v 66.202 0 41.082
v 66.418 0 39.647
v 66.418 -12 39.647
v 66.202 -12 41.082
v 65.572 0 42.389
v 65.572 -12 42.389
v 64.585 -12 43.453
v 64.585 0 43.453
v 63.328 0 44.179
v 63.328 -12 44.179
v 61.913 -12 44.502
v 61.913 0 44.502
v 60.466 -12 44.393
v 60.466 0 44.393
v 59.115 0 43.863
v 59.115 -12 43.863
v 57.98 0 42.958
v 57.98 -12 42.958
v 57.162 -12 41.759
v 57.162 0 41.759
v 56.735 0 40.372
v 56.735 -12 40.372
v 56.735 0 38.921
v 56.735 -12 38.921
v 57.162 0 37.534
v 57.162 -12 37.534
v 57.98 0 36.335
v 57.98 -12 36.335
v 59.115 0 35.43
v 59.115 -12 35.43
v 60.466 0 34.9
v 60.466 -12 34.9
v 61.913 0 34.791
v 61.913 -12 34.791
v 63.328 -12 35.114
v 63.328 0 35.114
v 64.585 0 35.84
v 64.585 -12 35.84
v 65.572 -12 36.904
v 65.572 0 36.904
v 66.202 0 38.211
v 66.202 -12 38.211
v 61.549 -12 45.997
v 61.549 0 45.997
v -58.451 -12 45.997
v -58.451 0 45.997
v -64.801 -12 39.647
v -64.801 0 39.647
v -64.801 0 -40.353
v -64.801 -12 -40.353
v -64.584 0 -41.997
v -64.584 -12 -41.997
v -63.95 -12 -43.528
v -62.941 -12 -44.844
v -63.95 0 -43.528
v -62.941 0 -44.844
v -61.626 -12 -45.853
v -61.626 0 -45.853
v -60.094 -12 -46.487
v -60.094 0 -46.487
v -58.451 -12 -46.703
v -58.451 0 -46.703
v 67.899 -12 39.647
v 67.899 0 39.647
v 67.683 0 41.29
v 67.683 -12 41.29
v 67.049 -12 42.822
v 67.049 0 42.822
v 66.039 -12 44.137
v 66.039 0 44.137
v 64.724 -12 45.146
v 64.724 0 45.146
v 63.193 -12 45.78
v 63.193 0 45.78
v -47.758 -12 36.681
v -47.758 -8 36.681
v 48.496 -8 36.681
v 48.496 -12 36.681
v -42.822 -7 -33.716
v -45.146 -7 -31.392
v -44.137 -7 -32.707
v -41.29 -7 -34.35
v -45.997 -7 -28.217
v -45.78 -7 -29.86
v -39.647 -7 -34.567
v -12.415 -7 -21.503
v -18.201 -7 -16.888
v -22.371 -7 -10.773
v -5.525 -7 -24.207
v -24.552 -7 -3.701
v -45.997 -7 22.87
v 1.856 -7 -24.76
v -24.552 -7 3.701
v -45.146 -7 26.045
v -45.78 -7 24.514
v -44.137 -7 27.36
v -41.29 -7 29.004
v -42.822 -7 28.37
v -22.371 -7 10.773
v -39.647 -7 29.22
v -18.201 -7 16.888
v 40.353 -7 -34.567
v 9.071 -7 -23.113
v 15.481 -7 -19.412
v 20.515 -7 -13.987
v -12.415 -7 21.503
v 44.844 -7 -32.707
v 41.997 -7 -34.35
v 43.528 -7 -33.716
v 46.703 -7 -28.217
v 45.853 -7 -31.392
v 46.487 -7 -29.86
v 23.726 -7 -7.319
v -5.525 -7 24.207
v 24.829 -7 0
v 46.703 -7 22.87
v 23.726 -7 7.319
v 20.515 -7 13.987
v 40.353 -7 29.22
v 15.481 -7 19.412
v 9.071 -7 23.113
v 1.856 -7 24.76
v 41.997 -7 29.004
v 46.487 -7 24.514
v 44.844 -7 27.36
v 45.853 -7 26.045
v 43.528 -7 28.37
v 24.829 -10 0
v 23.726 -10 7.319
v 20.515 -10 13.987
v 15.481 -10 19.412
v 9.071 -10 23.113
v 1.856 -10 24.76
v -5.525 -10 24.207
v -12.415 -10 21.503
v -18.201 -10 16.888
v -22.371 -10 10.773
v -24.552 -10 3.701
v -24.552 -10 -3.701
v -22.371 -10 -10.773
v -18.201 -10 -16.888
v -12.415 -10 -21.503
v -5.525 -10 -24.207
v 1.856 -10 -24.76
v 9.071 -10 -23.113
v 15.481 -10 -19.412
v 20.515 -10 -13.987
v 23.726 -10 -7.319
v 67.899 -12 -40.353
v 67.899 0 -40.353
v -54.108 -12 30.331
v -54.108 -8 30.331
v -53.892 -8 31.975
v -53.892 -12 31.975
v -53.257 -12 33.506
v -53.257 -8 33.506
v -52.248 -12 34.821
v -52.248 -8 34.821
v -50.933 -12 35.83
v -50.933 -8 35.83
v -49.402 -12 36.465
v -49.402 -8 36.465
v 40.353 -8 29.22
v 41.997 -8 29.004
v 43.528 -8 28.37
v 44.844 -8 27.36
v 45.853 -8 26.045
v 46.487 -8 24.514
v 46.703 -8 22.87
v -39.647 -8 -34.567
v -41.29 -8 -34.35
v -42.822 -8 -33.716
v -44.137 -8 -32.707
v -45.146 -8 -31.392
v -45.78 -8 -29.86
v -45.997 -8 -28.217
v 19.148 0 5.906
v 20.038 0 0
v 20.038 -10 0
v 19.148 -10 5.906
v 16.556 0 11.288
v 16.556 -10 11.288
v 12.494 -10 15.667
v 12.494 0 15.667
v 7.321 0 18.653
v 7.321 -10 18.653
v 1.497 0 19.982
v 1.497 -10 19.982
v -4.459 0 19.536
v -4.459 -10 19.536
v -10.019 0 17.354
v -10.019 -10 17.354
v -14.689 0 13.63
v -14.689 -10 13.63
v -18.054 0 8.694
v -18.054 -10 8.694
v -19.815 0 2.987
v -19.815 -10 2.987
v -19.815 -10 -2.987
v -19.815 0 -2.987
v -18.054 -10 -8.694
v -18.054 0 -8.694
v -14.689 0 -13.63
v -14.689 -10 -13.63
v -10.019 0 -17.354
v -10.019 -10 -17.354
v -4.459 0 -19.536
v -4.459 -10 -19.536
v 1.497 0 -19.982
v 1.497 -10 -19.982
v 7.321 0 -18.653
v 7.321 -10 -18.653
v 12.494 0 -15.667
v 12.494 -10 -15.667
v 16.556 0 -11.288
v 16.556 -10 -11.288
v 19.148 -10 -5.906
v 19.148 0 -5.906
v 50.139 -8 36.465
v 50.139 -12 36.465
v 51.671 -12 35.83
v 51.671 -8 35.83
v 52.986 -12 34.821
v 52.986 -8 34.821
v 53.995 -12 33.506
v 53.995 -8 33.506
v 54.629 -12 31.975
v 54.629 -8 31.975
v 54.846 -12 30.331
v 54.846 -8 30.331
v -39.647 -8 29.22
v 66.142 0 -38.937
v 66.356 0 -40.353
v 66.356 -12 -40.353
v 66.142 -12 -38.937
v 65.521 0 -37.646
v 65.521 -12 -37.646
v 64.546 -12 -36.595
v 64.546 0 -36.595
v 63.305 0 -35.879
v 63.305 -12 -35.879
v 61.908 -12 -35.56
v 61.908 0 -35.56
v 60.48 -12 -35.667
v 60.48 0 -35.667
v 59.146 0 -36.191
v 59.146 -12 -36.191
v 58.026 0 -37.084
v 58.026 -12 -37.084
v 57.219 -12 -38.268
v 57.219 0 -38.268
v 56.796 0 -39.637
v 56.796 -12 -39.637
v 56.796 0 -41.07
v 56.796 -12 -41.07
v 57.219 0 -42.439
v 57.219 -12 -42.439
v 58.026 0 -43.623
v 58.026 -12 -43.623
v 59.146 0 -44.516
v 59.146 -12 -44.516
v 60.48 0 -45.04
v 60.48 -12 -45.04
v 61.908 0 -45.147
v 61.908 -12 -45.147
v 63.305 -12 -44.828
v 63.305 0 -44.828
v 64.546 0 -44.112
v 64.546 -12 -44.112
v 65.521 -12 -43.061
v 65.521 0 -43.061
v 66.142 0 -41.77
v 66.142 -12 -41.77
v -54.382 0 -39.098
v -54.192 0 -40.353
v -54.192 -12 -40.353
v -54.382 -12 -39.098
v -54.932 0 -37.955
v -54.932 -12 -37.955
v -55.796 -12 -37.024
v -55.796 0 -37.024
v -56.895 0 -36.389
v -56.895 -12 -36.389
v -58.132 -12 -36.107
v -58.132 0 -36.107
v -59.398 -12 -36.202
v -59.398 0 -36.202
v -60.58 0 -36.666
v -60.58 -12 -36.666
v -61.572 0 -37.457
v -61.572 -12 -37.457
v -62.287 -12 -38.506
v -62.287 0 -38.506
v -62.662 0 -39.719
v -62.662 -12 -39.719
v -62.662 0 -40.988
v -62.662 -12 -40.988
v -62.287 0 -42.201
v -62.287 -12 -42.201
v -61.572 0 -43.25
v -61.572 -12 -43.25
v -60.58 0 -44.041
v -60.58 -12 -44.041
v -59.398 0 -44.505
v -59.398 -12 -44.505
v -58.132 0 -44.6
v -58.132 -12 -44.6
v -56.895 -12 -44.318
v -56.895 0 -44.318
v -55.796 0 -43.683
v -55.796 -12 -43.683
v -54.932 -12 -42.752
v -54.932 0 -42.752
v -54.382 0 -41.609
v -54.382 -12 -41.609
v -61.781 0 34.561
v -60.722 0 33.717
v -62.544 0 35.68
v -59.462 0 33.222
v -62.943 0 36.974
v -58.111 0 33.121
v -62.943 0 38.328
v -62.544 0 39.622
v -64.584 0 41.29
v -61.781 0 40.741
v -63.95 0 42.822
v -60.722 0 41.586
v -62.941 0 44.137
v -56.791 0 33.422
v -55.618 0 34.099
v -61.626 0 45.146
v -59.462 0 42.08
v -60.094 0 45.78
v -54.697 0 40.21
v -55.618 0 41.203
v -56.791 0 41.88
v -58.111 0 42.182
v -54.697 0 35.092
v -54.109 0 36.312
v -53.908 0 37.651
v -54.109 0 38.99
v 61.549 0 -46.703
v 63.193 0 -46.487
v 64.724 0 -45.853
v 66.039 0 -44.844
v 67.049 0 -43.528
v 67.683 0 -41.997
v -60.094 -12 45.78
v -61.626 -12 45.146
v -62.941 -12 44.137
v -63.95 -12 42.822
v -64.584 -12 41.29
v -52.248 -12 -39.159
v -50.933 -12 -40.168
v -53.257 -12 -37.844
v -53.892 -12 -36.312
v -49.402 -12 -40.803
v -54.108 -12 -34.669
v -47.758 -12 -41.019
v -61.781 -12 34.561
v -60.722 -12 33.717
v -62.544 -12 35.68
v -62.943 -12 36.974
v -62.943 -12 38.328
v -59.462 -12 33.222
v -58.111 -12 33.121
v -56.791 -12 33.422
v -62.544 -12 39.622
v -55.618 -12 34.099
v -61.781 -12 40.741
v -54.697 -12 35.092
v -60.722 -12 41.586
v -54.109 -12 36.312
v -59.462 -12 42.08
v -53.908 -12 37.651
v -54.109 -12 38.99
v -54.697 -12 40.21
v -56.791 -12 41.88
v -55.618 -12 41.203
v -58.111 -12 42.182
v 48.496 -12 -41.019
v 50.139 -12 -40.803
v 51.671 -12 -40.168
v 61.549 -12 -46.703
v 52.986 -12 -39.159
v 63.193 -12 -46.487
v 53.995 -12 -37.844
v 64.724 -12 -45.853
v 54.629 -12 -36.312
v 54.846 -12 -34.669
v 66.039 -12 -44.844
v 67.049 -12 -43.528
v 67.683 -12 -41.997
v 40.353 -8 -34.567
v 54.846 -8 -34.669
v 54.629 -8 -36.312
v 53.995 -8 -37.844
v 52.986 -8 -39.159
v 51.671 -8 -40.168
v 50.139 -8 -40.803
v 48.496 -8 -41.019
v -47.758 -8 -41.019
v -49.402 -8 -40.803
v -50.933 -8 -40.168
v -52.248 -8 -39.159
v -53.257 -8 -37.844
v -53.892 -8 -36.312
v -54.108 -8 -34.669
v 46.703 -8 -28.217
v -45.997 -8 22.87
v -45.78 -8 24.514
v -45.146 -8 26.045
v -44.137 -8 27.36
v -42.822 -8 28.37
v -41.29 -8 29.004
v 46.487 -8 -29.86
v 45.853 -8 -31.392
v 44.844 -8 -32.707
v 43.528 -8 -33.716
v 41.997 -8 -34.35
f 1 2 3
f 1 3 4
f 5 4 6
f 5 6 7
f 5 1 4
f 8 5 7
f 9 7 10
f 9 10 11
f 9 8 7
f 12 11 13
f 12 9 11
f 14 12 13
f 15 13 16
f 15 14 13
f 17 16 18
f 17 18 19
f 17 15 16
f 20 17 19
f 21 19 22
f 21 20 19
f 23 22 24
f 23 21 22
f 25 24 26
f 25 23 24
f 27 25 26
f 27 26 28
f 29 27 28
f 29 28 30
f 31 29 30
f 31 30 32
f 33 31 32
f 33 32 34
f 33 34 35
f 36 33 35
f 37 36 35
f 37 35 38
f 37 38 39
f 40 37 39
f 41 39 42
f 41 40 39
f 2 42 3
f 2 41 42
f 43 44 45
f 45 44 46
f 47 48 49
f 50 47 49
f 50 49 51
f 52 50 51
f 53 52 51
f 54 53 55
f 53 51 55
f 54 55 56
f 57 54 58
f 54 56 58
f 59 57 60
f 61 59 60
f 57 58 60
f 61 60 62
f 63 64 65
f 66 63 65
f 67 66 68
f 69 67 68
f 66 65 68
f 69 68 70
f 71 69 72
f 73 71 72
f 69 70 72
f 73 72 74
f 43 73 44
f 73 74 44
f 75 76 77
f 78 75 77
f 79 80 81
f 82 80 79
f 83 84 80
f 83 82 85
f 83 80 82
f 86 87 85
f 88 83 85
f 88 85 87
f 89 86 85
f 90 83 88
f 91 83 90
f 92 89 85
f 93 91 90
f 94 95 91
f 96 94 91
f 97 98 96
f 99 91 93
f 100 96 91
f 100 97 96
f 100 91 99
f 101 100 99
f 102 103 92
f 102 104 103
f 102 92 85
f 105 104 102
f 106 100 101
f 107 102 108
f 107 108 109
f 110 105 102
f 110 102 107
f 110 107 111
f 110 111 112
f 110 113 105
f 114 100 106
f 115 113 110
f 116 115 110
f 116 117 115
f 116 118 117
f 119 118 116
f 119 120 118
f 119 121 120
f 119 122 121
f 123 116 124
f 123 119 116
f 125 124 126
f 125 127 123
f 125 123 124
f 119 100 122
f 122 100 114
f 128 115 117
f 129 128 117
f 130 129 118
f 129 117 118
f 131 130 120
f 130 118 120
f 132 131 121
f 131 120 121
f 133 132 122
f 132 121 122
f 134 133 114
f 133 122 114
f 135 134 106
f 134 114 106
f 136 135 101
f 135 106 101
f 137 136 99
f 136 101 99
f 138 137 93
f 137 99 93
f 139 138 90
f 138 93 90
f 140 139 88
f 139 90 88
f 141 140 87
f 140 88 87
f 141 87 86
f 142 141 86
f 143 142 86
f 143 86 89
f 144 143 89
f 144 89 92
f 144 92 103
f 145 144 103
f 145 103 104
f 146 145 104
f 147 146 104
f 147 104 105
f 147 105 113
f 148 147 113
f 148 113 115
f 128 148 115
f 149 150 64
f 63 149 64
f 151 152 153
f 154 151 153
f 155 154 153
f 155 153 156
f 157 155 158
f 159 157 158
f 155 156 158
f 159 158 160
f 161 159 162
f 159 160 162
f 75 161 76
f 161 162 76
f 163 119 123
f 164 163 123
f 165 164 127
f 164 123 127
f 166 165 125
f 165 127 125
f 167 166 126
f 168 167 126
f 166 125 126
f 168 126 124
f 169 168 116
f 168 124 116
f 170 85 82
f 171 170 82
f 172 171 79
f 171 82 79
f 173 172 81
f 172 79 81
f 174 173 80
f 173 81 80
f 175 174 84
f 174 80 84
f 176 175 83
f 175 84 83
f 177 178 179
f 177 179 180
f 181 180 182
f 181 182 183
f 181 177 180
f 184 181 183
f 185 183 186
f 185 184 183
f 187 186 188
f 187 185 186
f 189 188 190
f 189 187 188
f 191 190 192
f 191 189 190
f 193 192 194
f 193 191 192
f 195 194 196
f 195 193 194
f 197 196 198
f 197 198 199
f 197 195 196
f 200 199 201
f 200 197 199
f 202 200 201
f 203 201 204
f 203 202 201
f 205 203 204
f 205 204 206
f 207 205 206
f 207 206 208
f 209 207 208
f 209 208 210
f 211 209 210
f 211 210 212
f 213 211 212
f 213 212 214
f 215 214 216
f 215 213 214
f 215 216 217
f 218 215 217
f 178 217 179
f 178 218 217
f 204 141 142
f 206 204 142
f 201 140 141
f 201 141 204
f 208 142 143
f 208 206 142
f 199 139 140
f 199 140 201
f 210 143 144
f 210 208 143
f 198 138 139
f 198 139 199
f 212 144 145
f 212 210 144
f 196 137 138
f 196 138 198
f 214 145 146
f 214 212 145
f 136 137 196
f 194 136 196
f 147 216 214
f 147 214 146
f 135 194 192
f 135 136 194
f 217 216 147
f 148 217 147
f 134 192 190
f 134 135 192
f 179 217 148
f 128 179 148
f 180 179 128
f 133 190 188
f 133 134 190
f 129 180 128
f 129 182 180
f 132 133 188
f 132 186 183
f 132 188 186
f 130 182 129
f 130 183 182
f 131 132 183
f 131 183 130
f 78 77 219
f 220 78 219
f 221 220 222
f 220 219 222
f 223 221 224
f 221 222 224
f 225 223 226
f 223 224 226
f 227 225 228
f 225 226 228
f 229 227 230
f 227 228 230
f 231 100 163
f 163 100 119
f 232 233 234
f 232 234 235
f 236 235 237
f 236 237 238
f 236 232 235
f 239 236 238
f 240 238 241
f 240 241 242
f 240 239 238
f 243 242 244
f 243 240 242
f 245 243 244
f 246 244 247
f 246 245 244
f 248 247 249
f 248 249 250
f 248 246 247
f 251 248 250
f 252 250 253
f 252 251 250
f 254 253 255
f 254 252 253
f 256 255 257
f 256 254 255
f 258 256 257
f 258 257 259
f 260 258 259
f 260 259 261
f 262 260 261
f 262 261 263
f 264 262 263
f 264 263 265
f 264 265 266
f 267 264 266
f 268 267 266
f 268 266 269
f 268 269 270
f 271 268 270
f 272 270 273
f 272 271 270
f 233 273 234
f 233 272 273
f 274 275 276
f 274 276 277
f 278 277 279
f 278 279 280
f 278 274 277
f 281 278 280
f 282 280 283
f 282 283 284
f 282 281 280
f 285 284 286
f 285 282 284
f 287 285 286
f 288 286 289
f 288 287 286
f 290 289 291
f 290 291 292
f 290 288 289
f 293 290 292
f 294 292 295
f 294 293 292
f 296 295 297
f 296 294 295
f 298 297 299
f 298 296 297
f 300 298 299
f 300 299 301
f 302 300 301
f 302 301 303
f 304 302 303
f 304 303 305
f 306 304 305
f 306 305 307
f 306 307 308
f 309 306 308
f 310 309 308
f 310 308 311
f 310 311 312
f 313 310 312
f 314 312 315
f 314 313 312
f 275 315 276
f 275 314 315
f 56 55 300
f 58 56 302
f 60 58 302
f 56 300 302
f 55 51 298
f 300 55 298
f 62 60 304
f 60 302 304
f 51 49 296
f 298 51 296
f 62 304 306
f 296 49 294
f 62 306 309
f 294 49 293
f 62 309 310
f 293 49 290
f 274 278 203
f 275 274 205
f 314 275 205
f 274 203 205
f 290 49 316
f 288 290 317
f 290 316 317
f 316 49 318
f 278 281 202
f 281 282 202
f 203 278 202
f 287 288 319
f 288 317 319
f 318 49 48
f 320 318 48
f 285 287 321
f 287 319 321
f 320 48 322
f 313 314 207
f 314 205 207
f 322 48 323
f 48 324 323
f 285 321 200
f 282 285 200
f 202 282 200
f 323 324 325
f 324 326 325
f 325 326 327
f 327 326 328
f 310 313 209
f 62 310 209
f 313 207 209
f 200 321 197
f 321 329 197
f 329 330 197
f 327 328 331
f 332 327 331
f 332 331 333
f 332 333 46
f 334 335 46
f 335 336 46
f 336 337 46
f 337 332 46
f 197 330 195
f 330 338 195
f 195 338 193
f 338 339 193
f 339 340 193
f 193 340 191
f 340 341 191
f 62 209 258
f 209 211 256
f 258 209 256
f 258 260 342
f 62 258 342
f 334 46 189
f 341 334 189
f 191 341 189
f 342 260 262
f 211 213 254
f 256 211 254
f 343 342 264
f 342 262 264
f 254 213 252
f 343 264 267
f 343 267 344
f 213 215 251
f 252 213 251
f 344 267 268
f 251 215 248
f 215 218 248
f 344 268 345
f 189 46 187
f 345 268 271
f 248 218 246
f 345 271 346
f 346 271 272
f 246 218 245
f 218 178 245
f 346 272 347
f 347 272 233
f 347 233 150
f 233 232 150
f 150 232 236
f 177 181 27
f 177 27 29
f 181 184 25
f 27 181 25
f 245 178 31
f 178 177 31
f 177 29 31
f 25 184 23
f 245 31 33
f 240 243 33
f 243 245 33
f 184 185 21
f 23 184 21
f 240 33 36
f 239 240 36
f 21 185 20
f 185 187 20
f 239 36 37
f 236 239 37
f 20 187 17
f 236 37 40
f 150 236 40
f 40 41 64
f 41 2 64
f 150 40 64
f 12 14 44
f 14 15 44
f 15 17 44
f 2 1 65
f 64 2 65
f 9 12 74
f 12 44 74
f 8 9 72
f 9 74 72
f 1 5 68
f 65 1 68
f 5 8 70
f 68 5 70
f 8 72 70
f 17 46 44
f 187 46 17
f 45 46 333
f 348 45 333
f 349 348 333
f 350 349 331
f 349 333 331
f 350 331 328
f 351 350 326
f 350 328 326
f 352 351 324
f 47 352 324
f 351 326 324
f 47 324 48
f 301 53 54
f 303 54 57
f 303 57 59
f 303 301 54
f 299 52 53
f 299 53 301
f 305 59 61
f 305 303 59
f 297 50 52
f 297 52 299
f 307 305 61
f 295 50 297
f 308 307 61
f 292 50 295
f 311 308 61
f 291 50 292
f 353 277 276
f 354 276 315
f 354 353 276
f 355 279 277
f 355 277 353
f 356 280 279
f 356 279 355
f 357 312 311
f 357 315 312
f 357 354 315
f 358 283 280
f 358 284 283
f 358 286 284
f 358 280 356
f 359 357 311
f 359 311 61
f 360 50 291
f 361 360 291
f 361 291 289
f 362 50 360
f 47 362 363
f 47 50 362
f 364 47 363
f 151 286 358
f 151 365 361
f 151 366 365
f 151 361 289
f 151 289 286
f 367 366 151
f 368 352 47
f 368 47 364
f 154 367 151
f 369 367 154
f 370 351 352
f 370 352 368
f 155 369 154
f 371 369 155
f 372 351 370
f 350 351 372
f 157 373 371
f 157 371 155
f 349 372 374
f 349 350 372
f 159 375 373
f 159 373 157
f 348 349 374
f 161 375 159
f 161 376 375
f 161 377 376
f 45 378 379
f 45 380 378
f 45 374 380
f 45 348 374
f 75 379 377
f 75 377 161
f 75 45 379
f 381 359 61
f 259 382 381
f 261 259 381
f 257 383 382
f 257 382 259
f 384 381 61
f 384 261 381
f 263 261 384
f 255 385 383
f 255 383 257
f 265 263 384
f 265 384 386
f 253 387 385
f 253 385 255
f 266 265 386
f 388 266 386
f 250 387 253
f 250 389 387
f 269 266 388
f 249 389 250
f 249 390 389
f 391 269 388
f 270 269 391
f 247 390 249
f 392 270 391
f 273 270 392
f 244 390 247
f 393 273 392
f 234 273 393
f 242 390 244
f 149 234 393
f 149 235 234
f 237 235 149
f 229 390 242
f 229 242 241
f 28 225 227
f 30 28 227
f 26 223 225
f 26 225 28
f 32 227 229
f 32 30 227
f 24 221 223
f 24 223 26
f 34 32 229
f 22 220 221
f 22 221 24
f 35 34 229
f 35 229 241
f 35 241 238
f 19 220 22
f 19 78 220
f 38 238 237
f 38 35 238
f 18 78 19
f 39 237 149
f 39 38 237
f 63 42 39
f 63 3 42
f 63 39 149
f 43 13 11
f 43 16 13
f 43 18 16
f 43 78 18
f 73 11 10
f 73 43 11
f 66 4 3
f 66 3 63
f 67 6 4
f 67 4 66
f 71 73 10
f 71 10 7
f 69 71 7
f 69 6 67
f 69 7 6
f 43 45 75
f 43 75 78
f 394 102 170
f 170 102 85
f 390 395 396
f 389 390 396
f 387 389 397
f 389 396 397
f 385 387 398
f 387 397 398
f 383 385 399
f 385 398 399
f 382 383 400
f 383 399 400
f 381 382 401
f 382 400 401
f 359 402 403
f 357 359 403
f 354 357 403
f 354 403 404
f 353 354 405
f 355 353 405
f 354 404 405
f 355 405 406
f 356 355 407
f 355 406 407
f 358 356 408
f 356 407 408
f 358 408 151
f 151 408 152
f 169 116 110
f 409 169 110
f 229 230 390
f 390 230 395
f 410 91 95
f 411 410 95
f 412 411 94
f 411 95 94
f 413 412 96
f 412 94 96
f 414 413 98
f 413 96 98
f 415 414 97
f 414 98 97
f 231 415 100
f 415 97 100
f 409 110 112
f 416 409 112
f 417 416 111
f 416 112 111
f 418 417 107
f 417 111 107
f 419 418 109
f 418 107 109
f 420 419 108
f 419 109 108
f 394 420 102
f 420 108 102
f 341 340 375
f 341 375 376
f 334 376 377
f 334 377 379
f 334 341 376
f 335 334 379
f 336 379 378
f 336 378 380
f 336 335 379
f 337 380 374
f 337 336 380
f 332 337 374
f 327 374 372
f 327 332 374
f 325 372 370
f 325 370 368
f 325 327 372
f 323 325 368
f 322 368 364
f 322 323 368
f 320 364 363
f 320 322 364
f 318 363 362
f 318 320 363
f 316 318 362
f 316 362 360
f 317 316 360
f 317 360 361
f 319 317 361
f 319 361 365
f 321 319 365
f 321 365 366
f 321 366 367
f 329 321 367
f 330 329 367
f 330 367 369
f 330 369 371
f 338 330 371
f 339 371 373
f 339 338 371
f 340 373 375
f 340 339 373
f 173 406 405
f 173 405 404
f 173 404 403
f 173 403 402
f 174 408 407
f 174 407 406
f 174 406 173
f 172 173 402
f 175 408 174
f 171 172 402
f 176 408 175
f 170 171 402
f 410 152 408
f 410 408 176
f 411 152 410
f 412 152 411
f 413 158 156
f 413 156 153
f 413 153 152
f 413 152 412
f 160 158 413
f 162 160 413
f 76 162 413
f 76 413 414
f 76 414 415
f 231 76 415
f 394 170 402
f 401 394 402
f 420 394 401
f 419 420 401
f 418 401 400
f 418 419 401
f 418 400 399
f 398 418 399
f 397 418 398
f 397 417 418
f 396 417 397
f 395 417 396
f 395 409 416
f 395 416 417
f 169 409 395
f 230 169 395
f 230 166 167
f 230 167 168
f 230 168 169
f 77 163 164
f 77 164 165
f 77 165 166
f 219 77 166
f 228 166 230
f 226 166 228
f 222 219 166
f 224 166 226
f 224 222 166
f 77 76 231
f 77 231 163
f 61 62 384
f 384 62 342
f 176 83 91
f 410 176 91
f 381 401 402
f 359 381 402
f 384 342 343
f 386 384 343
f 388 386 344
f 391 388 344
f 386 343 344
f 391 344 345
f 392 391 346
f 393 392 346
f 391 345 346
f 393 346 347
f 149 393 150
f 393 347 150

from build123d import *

# Parameters (mm, degrees)
F0_R     = 4.258407
F0_R_2   = 4.806756
F0_R_3   = 4.543111
F0_R_4   = 4.869038
F1_DEPTH = 12
F2_DEPTH = 8
F0_R_5   = 24.829414
F3_DEPTH = 7
F0_R_6   = 20.038363
F4_DEPTH = 10


with BuildPart() as f1:
    # F0 (on Front) → F1 (new body)
    with BuildSketch(Plane.XZ):
        with BuildLine():
            Line((61.549276, 45.996532), (-58.450724, 45.996532))
            ThreePointArc((-58.450724, 45.996532), (-62.940852, 44.13666), (-64.800724, 39.646532))
            Line((-64.800724, 39.646532), (-64.800724, -40.353468))
            ThreePointArc((-64.800724, -40.353468), (-62.940852, -44.843596), (-58.450724, -46.703468))
            Line((-58.450724, -46.703468), (61.549276, -46.703468))
            ThreePointArc((61.549276, -46.703468), (66.039404, -44.843596), (67.899276, -40.353468))
            Line((67.899276, -40.353468), (67.899276, 39.646532))
            ThreePointArc((67.899276, 39.646532), (66.039404, 44.13666), (61.549276, 45.996532))
        make_face()
        with Locations((-58.450724, -40.353468)):
            Circle(F0_R, mode=Mode.SUBTRACT)
        with BuildLine():
            ThreePointArc((-54.108147, 30.331052), (-52.248275, 34.82118), (-47.758147, 36.681052))
            Line((-47.758147, 36.681052), (48.495564, 36.681052))
            ThreePointArc((48.495564, 36.681052), (52.985692, 34.82118), (54.845564, 30.331052))
            Line((54.845564, 30.331052), (54.845564, -34.668948))
            ThreePointArc((54.845564, -34.668948), (52.985692, -39.159076), (48.495564, -41.018948))
            Line((48.495564, -41.018948), (-47.758147, -41.018948))
            ThreePointArc((-47.758147, -41.018948), (-52.248275, -39.159076), (-54.108147, -34.668948))
            Line((-54.108147, -34.668948), (-54.108147, 30.331052))
        make_face(mode=Mode.SUBTRACT)
        with Locations((61.549276, -40.353468)):
            Circle(F0_R_2, mode=Mode.SUBTRACT)
        with Locations((-58.450724, 37.651211)):
            Circle(F0_R_3, mode=Mode.SUBTRACT)
        with Locations((61.549276, 39.646532)):
            Circle(F0_R_4, mode=Mode.SUBTRACT)
    extrude(amount=F1_DEPTH)

    # F0 (on Front) → F2 (join)
    with BuildSketch(Plane.XZ):
        with BuildLine():
            Line((48.495564, 36.681052), (-47.758147, 36.681052))
            ThreePointArc((-47.758147, 36.681052), (-52.248275, 34.82118), (-54.108147, 30.331052))
            Line((-54.108147, 30.331052), (-54.108147, -34.668948))
            ThreePointArc((-54.108147, -34.668948), (-52.248275, -39.159076), (-47.758147, -41.018948))
            Line((-47.758147, -41.018948), (48.495564, -41.018948))
            ThreePointArc((48.495564, -41.018948), (52.985692, -39.159076), (54.845564, -34.668948))
            Line((54.845564, -34.668948), (54.845564, 30.331052))
            ThreePointArc((54.845564, 30.331052), (52.985692, 34.82118), (48.495564, 36.681052))
        make_face()
        with BuildLine():
            ThreePointArc((-45.996532, 22.870242), (-44.13666, 27.36037), (-39.646532, 29.220242))
            Line((-39.646532, 29.220242), (40.353468, 29.220242))
            ThreePointArc((40.353468, 29.220242), (44.843596, 27.36037), (46.703468, 22.870242))
            Line((46.703468, 22.870242), (46.703468, -28.216533))
            ThreePointArc((46.703468, -28.216533), (44.843596, -32.706661), (40.353468, -34.566533))
            Line((40.353468, -34.566533), (-39.646532, -34.566533))
            ThreePointArc((-39.646532, -34.566533), (-44.13666, -32.706661), (-45.996532, -28.216533))
            Line((-45.996532, -28.216533), (-45.996532, 22.870242))
        make_face(mode=Mode.SUBTRACT)
    extrude(amount=F2_DEPTH)

    # F0 (on Front) → F3 (join)
    with BuildSketch(Plane.XZ):
        with BuildLine():
            Line((40.353468, 29.220242), (-39.646532, 29.220242))
            ThreePointArc((-39.646532, 29.220242), (-44.13666, 27.36037), (-45.996532, 22.870242))
            Line((-45.996532, 22.870242), (-45.996532, -28.216533))
            ThreePointArc((-45.996532, -28.216533), (-44.13666, -32.706661), (-39.646532, -34.566533))
            Line((-39.646532, -34.566533), (40.353468, -34.566533))
            ThreePointArc((40.353468, -34.566533), (44.843596, -32.706661), (46.703468, -28.216533))
            Line((46.703468, -28.216533), (46.703468, 22.870242))
            ThreePointArc((46.703468, 22.870242), (44.843596, 27.36037), (40.353468, 29.220242))
        make_face()
        Circle(F0_R_5, mode=Mode.SUBTRACT)
    extrude(amount=F3_DEPTH)

    # F0 (on Front) → F4 (join)
    with BuildSketch(Plane.XZ):
        Circle(F0_R_5)
        Circle(F0_R_6, mode=Mode.SUBTRACT)
    extrude(amount=F4_DEPTH)


solid = f1.part
